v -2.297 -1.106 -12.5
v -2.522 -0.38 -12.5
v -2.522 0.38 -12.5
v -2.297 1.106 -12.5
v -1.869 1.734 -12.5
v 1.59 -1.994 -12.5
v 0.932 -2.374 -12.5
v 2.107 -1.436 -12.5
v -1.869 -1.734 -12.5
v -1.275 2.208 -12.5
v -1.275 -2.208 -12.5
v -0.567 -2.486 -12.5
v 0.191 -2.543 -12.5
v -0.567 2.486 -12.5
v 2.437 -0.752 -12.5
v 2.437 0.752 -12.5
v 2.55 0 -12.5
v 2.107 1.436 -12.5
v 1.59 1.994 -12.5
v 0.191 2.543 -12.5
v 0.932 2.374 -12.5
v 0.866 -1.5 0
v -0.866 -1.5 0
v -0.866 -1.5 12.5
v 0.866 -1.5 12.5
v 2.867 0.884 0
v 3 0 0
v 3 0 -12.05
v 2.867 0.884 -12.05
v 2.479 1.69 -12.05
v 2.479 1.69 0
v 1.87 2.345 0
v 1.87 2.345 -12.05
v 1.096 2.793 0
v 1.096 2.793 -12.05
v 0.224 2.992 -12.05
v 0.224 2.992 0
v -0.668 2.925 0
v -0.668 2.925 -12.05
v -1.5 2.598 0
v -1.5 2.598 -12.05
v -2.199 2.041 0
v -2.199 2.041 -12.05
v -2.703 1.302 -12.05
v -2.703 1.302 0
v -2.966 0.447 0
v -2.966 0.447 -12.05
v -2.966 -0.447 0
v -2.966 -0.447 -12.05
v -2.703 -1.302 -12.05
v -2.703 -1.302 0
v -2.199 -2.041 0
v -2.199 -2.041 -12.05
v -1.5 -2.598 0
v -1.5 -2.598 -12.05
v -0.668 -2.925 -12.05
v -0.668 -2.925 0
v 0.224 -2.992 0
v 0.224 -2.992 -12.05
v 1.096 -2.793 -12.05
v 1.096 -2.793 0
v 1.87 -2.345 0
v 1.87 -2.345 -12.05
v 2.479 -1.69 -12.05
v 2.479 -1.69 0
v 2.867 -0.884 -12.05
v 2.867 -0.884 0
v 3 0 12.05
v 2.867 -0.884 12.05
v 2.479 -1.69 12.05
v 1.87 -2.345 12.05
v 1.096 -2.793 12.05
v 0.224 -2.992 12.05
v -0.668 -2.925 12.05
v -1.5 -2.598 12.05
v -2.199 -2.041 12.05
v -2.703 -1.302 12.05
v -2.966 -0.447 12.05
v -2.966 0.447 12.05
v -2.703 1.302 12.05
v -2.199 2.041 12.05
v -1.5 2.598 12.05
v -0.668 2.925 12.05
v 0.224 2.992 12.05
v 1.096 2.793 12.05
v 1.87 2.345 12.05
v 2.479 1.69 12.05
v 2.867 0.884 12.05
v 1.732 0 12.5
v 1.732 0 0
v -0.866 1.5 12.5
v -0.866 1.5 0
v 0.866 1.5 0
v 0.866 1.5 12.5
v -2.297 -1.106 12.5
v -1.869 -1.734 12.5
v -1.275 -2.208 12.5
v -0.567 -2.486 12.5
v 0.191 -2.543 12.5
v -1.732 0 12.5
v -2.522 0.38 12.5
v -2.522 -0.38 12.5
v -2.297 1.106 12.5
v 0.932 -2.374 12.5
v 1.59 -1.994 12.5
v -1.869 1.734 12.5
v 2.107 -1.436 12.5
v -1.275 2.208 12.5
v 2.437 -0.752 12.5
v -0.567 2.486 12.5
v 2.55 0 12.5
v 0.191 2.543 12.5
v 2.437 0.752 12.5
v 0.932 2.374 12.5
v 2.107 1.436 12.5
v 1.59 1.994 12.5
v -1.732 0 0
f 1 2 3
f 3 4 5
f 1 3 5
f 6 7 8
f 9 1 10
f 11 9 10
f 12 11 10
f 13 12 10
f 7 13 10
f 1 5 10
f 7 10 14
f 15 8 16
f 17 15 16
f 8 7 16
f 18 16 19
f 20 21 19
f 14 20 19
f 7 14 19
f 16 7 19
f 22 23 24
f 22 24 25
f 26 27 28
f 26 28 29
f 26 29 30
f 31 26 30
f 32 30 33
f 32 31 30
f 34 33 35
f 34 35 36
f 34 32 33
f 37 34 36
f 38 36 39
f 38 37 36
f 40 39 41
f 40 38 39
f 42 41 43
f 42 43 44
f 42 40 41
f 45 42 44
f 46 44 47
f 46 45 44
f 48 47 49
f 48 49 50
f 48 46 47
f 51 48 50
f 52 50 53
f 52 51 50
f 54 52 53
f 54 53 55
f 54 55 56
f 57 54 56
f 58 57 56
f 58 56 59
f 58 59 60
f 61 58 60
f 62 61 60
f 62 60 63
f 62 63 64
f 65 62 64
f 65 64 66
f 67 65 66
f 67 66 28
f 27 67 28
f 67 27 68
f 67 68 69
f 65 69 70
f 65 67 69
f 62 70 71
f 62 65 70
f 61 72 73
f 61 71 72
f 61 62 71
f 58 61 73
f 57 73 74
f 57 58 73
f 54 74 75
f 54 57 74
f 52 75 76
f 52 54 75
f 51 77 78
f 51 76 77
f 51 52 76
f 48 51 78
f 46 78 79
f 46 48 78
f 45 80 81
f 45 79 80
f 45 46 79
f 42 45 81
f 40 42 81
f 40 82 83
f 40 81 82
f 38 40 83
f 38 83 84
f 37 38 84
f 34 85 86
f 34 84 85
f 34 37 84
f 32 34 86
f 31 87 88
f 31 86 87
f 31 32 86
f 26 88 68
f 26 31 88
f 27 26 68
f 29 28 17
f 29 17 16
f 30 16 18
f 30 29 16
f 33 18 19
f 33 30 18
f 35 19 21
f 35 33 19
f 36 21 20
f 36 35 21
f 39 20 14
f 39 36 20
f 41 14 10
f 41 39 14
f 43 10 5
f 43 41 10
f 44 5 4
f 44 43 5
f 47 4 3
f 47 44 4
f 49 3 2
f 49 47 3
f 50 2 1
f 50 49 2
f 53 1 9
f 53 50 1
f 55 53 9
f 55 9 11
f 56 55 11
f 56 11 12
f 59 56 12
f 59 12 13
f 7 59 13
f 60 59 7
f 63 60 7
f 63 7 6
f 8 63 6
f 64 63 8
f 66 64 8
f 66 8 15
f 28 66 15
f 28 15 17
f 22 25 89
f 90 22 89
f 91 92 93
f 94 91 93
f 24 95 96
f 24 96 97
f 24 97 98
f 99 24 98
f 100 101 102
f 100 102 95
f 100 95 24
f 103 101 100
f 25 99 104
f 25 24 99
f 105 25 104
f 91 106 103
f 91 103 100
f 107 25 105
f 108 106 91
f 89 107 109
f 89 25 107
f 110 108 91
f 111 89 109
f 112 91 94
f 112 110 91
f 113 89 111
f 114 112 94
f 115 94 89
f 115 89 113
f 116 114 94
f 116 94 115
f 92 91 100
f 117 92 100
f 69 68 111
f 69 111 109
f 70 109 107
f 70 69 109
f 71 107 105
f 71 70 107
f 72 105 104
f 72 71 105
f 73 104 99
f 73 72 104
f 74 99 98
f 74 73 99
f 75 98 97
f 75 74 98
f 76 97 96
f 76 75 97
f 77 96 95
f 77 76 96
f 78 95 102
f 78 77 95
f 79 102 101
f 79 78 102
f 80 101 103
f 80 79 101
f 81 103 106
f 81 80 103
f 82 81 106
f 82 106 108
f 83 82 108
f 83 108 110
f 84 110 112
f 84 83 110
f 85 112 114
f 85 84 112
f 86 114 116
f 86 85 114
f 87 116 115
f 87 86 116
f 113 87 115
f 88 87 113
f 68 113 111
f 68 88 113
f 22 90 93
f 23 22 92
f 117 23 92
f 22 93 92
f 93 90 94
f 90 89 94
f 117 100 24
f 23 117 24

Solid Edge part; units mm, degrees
sketch "Sketch1" plane through (0, 0, 0) normal (0, 0, 1) x (1, 0, 0)
  circle A0 centre (0, 0) radius 3
  dimension "D1" = 6
extrude "Protrusion1" add sketch "Sketch1" along normal mid plane 25
chamfer "Chamfer1" distance 0.45 angle 45 2 edges at (-3, 0, -12.5) (-3, 0, 12.5)
sketch "Sketch2" plane through (0, 0, 12.5) normal (0, 0, 1) x (1, 0, 0)
  line L0 (-0.866, 1.5) -> (0.866, 1.5)
  line L1 (1.7321, 0) -> (0.866, 1.5)
  line L2 (0.866, -1.5) -> (1.7321, 0)
  line L3 (-0.866, -1.5) -> (0.866, -1.5)
  line L4 (-1.7321, 0) -> (-0.866, -1.5)
  line L5 (-0.866, 1.5) -> (-1.7321, 0)
  dimension "D1" = 3
extrude "Cutout1" cut sketch "Sketch2" against normal blind 12.5
properties part number "24104559"
